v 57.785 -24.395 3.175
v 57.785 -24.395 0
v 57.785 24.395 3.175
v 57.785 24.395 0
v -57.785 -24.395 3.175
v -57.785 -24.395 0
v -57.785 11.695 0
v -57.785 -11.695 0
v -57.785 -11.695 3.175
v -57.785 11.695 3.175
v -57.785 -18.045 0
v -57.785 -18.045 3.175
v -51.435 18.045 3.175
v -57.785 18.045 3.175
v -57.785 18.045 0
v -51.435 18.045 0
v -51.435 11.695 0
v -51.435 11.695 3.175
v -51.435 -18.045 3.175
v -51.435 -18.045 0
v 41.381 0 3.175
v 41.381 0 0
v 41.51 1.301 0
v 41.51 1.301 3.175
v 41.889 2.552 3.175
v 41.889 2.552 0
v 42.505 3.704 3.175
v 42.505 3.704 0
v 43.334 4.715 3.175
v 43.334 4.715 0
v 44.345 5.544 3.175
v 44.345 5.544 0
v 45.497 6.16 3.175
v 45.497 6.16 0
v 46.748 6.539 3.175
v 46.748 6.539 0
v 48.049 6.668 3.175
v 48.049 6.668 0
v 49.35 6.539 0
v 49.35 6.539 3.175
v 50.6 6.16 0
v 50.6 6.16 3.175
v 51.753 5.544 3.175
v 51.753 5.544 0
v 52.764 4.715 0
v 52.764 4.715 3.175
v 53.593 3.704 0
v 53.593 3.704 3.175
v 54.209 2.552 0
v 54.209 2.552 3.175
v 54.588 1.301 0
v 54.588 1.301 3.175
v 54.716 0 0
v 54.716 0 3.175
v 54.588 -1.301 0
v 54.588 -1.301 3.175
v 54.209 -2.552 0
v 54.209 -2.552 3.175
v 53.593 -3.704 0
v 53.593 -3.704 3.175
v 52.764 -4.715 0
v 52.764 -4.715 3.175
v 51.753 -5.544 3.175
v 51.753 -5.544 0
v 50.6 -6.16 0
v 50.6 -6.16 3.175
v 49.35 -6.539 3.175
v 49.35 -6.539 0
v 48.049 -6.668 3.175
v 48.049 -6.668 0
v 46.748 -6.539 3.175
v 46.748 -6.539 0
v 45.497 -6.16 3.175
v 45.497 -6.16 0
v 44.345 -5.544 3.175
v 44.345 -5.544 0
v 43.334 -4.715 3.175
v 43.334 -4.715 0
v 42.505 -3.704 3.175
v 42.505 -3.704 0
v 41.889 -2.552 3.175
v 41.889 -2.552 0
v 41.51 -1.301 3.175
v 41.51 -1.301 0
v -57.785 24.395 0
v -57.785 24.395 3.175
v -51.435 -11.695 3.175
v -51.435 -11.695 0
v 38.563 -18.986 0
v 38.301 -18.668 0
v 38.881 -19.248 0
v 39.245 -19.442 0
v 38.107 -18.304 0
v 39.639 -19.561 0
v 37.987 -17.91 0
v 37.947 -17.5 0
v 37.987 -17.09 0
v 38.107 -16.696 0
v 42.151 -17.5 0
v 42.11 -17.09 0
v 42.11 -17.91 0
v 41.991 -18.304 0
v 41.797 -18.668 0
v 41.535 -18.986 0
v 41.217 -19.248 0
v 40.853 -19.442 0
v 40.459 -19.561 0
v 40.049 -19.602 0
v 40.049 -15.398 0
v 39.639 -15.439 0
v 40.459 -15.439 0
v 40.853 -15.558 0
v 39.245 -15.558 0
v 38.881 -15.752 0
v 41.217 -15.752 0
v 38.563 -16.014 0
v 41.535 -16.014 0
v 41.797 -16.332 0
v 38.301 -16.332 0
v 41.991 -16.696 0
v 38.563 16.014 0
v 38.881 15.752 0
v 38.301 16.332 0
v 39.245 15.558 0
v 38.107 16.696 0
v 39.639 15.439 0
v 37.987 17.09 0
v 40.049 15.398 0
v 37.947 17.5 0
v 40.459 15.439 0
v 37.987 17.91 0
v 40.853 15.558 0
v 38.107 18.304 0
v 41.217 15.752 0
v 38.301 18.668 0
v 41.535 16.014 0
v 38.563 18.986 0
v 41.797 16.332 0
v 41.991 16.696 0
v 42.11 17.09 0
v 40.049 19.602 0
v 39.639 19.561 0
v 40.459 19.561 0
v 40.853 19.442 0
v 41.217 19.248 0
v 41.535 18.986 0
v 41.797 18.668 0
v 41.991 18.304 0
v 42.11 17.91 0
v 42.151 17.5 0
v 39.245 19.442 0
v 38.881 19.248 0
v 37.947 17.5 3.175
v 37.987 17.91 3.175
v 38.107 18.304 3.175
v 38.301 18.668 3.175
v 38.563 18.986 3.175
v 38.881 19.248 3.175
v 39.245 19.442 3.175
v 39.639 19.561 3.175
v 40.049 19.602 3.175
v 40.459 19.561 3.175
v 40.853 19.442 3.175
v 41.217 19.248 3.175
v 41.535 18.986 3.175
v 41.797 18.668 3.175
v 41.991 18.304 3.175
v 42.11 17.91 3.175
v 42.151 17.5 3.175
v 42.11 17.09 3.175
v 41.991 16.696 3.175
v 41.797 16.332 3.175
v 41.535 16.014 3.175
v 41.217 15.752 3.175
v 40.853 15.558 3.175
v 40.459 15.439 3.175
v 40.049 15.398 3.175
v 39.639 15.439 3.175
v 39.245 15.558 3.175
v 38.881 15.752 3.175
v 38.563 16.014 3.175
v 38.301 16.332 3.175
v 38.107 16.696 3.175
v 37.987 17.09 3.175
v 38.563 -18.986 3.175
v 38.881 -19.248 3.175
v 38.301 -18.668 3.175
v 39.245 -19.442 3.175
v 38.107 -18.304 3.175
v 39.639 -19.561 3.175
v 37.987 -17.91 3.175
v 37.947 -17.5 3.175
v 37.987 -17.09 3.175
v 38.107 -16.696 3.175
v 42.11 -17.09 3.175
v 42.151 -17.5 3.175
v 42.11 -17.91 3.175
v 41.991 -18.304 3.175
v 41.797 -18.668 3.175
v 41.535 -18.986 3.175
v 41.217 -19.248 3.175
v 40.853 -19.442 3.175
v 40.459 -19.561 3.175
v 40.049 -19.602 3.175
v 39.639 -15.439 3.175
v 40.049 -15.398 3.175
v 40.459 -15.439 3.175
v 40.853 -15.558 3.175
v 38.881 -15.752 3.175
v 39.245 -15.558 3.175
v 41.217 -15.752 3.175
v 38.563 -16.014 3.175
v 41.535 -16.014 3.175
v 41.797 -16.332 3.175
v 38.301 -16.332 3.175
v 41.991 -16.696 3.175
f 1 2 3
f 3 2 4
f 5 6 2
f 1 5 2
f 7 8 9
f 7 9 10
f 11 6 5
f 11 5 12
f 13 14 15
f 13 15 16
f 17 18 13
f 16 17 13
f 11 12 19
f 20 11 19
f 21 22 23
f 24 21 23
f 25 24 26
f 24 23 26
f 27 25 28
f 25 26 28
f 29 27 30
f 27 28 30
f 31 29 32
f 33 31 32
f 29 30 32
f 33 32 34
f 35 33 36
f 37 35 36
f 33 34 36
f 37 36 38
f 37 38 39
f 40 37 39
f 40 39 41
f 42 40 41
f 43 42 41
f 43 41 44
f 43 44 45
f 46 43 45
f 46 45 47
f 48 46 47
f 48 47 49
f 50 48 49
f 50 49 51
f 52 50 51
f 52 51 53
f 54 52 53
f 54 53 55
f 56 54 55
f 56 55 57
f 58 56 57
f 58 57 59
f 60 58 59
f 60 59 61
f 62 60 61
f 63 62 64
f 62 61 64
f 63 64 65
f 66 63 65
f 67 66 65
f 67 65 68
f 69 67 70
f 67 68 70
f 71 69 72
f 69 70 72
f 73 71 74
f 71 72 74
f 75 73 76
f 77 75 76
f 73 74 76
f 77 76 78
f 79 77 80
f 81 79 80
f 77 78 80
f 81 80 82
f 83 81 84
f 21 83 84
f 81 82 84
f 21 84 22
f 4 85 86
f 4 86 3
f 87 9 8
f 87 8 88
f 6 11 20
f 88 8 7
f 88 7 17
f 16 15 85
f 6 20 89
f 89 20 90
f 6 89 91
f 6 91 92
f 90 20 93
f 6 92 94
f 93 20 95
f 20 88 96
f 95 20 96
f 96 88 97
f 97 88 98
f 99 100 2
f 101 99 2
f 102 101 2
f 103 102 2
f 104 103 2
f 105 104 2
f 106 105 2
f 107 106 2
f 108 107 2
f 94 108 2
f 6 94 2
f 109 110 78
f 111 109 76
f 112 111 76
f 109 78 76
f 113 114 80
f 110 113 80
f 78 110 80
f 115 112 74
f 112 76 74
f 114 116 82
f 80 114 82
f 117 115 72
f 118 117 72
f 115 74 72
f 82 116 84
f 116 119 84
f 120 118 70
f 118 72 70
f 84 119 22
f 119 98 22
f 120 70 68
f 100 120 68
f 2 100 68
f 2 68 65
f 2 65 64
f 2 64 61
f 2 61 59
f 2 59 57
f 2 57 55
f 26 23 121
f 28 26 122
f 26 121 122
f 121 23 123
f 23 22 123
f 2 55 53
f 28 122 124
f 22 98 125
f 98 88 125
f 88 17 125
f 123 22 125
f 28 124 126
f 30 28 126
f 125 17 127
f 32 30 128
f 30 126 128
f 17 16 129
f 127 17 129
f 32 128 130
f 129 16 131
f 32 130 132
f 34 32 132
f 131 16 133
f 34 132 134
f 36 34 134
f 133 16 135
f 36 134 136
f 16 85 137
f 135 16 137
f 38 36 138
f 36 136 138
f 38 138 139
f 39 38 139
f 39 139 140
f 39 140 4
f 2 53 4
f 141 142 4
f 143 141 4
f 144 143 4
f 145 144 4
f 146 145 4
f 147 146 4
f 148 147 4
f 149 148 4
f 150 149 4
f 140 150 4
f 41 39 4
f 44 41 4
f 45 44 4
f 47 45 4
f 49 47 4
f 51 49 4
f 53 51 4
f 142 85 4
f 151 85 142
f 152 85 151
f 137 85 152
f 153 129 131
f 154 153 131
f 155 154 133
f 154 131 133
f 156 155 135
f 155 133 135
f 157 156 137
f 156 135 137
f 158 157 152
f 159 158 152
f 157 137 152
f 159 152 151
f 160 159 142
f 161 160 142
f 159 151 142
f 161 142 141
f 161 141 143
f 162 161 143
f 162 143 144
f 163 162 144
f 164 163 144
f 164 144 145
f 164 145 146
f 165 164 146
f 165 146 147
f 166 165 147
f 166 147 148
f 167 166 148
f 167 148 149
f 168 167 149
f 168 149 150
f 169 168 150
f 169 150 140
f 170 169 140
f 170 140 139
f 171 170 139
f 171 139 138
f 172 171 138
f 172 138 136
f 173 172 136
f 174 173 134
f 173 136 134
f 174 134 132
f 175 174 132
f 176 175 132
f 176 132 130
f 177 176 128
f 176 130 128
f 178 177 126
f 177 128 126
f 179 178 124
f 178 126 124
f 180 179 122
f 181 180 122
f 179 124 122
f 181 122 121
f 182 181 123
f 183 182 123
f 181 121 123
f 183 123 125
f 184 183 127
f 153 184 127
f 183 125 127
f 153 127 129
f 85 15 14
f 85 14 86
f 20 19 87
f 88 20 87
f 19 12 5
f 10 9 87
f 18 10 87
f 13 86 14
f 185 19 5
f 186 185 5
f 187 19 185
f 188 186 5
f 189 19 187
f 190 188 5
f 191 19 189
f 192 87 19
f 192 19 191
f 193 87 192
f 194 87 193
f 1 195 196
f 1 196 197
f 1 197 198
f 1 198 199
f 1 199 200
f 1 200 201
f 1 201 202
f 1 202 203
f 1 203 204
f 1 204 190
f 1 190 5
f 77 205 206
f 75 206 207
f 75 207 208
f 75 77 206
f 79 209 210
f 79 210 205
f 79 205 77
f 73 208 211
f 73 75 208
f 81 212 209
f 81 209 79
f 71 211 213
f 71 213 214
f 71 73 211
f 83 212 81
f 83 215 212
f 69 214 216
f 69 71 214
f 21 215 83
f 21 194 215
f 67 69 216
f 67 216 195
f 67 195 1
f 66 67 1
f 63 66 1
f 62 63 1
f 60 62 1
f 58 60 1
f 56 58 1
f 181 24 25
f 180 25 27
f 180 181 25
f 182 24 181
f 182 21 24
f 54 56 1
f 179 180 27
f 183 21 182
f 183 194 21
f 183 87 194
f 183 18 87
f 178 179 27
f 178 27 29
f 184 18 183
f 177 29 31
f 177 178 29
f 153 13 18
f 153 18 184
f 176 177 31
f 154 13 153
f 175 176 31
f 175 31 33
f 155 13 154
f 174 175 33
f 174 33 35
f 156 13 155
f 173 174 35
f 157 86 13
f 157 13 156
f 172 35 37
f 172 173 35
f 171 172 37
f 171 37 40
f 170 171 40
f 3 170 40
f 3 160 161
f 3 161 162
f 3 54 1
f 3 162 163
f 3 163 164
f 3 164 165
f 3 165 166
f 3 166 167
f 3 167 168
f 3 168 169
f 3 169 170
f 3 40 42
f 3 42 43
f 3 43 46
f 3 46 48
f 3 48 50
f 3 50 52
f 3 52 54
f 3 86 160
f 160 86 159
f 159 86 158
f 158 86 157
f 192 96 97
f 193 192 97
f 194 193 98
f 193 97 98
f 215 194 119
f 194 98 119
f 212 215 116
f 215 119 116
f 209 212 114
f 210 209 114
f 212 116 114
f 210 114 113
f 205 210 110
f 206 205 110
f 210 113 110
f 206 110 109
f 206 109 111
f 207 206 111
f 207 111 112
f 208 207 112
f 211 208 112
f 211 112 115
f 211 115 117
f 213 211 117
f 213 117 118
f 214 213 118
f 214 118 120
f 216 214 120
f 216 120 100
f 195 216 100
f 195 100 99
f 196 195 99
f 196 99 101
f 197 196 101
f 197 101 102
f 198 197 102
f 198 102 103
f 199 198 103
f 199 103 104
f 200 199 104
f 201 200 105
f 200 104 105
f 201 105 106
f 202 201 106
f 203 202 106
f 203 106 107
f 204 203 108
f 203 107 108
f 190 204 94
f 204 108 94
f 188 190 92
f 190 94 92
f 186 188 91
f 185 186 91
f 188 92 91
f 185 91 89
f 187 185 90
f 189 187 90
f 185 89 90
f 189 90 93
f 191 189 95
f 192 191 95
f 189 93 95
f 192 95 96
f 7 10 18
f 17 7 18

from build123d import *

# Parameters (mm, degrees)
SKETCH1_W           = 115.57
SKETCH1_H           = 48.789667988
BOSS_EXTRUDE1_DEPTH = 3.175
SKETCH2_R           = 2.10185
SKETCH2_R_2         = 6.6675
CUT_EXTRUDE1_DEPTH  = 63.80362072
SKETCH3_W           = 6.35
SKETCH3_H           = 6.35
CUT_EXTRUDE2_DEPTH  = 63.80362072


with BuildPart() as part:
    # Sketch1 → Boss-Extrude1 (new body)
    with BuildSketch(Plane.XY):
        Rectangle(SKETCH1_W, SKETCH1_H)
    extrude(amount=BOSS_EXTRUDE1_DEPTH)

    # Sketch2 → Cut-Extrude1 (cut, through all)
    with BuildSketch(Plane(origin=(0, 0, 0), x_dir=(-1, 0, 0), z_dir=(0, 0, -1))):
        with Locations((-40.04893274, 17.5)):
            Circle(SKETCH2_R)
        with Locations((-40.04893274, -17.5)):
            Circle(SKETCH2_R)
        with Locations((-48.04893274, 0)):
            Circle(SKETCH2_R_2)
    extrude(amount=-CUT_EXTRUDE1_DEPTH, mode=Mode.SUBTRACT)

    # Sketch3 → Cut-Extrude2 (cut, through all)
    with BuildSketch(Plane.XY.offset(3.175)):
        with Locations((-54.61, 14.869833994)):
            Rectangle(SKETCH3_W, SKETCH3_H)
        with Locations((-54.61, -14.869833994)):
            Rectangle(SKETCH3_W, SKETCH3_H)
    extrude(amount=-CUT_EXTRUDE2_DEPTH, mode=Mode.SUBTRACT)


solid = part.part
